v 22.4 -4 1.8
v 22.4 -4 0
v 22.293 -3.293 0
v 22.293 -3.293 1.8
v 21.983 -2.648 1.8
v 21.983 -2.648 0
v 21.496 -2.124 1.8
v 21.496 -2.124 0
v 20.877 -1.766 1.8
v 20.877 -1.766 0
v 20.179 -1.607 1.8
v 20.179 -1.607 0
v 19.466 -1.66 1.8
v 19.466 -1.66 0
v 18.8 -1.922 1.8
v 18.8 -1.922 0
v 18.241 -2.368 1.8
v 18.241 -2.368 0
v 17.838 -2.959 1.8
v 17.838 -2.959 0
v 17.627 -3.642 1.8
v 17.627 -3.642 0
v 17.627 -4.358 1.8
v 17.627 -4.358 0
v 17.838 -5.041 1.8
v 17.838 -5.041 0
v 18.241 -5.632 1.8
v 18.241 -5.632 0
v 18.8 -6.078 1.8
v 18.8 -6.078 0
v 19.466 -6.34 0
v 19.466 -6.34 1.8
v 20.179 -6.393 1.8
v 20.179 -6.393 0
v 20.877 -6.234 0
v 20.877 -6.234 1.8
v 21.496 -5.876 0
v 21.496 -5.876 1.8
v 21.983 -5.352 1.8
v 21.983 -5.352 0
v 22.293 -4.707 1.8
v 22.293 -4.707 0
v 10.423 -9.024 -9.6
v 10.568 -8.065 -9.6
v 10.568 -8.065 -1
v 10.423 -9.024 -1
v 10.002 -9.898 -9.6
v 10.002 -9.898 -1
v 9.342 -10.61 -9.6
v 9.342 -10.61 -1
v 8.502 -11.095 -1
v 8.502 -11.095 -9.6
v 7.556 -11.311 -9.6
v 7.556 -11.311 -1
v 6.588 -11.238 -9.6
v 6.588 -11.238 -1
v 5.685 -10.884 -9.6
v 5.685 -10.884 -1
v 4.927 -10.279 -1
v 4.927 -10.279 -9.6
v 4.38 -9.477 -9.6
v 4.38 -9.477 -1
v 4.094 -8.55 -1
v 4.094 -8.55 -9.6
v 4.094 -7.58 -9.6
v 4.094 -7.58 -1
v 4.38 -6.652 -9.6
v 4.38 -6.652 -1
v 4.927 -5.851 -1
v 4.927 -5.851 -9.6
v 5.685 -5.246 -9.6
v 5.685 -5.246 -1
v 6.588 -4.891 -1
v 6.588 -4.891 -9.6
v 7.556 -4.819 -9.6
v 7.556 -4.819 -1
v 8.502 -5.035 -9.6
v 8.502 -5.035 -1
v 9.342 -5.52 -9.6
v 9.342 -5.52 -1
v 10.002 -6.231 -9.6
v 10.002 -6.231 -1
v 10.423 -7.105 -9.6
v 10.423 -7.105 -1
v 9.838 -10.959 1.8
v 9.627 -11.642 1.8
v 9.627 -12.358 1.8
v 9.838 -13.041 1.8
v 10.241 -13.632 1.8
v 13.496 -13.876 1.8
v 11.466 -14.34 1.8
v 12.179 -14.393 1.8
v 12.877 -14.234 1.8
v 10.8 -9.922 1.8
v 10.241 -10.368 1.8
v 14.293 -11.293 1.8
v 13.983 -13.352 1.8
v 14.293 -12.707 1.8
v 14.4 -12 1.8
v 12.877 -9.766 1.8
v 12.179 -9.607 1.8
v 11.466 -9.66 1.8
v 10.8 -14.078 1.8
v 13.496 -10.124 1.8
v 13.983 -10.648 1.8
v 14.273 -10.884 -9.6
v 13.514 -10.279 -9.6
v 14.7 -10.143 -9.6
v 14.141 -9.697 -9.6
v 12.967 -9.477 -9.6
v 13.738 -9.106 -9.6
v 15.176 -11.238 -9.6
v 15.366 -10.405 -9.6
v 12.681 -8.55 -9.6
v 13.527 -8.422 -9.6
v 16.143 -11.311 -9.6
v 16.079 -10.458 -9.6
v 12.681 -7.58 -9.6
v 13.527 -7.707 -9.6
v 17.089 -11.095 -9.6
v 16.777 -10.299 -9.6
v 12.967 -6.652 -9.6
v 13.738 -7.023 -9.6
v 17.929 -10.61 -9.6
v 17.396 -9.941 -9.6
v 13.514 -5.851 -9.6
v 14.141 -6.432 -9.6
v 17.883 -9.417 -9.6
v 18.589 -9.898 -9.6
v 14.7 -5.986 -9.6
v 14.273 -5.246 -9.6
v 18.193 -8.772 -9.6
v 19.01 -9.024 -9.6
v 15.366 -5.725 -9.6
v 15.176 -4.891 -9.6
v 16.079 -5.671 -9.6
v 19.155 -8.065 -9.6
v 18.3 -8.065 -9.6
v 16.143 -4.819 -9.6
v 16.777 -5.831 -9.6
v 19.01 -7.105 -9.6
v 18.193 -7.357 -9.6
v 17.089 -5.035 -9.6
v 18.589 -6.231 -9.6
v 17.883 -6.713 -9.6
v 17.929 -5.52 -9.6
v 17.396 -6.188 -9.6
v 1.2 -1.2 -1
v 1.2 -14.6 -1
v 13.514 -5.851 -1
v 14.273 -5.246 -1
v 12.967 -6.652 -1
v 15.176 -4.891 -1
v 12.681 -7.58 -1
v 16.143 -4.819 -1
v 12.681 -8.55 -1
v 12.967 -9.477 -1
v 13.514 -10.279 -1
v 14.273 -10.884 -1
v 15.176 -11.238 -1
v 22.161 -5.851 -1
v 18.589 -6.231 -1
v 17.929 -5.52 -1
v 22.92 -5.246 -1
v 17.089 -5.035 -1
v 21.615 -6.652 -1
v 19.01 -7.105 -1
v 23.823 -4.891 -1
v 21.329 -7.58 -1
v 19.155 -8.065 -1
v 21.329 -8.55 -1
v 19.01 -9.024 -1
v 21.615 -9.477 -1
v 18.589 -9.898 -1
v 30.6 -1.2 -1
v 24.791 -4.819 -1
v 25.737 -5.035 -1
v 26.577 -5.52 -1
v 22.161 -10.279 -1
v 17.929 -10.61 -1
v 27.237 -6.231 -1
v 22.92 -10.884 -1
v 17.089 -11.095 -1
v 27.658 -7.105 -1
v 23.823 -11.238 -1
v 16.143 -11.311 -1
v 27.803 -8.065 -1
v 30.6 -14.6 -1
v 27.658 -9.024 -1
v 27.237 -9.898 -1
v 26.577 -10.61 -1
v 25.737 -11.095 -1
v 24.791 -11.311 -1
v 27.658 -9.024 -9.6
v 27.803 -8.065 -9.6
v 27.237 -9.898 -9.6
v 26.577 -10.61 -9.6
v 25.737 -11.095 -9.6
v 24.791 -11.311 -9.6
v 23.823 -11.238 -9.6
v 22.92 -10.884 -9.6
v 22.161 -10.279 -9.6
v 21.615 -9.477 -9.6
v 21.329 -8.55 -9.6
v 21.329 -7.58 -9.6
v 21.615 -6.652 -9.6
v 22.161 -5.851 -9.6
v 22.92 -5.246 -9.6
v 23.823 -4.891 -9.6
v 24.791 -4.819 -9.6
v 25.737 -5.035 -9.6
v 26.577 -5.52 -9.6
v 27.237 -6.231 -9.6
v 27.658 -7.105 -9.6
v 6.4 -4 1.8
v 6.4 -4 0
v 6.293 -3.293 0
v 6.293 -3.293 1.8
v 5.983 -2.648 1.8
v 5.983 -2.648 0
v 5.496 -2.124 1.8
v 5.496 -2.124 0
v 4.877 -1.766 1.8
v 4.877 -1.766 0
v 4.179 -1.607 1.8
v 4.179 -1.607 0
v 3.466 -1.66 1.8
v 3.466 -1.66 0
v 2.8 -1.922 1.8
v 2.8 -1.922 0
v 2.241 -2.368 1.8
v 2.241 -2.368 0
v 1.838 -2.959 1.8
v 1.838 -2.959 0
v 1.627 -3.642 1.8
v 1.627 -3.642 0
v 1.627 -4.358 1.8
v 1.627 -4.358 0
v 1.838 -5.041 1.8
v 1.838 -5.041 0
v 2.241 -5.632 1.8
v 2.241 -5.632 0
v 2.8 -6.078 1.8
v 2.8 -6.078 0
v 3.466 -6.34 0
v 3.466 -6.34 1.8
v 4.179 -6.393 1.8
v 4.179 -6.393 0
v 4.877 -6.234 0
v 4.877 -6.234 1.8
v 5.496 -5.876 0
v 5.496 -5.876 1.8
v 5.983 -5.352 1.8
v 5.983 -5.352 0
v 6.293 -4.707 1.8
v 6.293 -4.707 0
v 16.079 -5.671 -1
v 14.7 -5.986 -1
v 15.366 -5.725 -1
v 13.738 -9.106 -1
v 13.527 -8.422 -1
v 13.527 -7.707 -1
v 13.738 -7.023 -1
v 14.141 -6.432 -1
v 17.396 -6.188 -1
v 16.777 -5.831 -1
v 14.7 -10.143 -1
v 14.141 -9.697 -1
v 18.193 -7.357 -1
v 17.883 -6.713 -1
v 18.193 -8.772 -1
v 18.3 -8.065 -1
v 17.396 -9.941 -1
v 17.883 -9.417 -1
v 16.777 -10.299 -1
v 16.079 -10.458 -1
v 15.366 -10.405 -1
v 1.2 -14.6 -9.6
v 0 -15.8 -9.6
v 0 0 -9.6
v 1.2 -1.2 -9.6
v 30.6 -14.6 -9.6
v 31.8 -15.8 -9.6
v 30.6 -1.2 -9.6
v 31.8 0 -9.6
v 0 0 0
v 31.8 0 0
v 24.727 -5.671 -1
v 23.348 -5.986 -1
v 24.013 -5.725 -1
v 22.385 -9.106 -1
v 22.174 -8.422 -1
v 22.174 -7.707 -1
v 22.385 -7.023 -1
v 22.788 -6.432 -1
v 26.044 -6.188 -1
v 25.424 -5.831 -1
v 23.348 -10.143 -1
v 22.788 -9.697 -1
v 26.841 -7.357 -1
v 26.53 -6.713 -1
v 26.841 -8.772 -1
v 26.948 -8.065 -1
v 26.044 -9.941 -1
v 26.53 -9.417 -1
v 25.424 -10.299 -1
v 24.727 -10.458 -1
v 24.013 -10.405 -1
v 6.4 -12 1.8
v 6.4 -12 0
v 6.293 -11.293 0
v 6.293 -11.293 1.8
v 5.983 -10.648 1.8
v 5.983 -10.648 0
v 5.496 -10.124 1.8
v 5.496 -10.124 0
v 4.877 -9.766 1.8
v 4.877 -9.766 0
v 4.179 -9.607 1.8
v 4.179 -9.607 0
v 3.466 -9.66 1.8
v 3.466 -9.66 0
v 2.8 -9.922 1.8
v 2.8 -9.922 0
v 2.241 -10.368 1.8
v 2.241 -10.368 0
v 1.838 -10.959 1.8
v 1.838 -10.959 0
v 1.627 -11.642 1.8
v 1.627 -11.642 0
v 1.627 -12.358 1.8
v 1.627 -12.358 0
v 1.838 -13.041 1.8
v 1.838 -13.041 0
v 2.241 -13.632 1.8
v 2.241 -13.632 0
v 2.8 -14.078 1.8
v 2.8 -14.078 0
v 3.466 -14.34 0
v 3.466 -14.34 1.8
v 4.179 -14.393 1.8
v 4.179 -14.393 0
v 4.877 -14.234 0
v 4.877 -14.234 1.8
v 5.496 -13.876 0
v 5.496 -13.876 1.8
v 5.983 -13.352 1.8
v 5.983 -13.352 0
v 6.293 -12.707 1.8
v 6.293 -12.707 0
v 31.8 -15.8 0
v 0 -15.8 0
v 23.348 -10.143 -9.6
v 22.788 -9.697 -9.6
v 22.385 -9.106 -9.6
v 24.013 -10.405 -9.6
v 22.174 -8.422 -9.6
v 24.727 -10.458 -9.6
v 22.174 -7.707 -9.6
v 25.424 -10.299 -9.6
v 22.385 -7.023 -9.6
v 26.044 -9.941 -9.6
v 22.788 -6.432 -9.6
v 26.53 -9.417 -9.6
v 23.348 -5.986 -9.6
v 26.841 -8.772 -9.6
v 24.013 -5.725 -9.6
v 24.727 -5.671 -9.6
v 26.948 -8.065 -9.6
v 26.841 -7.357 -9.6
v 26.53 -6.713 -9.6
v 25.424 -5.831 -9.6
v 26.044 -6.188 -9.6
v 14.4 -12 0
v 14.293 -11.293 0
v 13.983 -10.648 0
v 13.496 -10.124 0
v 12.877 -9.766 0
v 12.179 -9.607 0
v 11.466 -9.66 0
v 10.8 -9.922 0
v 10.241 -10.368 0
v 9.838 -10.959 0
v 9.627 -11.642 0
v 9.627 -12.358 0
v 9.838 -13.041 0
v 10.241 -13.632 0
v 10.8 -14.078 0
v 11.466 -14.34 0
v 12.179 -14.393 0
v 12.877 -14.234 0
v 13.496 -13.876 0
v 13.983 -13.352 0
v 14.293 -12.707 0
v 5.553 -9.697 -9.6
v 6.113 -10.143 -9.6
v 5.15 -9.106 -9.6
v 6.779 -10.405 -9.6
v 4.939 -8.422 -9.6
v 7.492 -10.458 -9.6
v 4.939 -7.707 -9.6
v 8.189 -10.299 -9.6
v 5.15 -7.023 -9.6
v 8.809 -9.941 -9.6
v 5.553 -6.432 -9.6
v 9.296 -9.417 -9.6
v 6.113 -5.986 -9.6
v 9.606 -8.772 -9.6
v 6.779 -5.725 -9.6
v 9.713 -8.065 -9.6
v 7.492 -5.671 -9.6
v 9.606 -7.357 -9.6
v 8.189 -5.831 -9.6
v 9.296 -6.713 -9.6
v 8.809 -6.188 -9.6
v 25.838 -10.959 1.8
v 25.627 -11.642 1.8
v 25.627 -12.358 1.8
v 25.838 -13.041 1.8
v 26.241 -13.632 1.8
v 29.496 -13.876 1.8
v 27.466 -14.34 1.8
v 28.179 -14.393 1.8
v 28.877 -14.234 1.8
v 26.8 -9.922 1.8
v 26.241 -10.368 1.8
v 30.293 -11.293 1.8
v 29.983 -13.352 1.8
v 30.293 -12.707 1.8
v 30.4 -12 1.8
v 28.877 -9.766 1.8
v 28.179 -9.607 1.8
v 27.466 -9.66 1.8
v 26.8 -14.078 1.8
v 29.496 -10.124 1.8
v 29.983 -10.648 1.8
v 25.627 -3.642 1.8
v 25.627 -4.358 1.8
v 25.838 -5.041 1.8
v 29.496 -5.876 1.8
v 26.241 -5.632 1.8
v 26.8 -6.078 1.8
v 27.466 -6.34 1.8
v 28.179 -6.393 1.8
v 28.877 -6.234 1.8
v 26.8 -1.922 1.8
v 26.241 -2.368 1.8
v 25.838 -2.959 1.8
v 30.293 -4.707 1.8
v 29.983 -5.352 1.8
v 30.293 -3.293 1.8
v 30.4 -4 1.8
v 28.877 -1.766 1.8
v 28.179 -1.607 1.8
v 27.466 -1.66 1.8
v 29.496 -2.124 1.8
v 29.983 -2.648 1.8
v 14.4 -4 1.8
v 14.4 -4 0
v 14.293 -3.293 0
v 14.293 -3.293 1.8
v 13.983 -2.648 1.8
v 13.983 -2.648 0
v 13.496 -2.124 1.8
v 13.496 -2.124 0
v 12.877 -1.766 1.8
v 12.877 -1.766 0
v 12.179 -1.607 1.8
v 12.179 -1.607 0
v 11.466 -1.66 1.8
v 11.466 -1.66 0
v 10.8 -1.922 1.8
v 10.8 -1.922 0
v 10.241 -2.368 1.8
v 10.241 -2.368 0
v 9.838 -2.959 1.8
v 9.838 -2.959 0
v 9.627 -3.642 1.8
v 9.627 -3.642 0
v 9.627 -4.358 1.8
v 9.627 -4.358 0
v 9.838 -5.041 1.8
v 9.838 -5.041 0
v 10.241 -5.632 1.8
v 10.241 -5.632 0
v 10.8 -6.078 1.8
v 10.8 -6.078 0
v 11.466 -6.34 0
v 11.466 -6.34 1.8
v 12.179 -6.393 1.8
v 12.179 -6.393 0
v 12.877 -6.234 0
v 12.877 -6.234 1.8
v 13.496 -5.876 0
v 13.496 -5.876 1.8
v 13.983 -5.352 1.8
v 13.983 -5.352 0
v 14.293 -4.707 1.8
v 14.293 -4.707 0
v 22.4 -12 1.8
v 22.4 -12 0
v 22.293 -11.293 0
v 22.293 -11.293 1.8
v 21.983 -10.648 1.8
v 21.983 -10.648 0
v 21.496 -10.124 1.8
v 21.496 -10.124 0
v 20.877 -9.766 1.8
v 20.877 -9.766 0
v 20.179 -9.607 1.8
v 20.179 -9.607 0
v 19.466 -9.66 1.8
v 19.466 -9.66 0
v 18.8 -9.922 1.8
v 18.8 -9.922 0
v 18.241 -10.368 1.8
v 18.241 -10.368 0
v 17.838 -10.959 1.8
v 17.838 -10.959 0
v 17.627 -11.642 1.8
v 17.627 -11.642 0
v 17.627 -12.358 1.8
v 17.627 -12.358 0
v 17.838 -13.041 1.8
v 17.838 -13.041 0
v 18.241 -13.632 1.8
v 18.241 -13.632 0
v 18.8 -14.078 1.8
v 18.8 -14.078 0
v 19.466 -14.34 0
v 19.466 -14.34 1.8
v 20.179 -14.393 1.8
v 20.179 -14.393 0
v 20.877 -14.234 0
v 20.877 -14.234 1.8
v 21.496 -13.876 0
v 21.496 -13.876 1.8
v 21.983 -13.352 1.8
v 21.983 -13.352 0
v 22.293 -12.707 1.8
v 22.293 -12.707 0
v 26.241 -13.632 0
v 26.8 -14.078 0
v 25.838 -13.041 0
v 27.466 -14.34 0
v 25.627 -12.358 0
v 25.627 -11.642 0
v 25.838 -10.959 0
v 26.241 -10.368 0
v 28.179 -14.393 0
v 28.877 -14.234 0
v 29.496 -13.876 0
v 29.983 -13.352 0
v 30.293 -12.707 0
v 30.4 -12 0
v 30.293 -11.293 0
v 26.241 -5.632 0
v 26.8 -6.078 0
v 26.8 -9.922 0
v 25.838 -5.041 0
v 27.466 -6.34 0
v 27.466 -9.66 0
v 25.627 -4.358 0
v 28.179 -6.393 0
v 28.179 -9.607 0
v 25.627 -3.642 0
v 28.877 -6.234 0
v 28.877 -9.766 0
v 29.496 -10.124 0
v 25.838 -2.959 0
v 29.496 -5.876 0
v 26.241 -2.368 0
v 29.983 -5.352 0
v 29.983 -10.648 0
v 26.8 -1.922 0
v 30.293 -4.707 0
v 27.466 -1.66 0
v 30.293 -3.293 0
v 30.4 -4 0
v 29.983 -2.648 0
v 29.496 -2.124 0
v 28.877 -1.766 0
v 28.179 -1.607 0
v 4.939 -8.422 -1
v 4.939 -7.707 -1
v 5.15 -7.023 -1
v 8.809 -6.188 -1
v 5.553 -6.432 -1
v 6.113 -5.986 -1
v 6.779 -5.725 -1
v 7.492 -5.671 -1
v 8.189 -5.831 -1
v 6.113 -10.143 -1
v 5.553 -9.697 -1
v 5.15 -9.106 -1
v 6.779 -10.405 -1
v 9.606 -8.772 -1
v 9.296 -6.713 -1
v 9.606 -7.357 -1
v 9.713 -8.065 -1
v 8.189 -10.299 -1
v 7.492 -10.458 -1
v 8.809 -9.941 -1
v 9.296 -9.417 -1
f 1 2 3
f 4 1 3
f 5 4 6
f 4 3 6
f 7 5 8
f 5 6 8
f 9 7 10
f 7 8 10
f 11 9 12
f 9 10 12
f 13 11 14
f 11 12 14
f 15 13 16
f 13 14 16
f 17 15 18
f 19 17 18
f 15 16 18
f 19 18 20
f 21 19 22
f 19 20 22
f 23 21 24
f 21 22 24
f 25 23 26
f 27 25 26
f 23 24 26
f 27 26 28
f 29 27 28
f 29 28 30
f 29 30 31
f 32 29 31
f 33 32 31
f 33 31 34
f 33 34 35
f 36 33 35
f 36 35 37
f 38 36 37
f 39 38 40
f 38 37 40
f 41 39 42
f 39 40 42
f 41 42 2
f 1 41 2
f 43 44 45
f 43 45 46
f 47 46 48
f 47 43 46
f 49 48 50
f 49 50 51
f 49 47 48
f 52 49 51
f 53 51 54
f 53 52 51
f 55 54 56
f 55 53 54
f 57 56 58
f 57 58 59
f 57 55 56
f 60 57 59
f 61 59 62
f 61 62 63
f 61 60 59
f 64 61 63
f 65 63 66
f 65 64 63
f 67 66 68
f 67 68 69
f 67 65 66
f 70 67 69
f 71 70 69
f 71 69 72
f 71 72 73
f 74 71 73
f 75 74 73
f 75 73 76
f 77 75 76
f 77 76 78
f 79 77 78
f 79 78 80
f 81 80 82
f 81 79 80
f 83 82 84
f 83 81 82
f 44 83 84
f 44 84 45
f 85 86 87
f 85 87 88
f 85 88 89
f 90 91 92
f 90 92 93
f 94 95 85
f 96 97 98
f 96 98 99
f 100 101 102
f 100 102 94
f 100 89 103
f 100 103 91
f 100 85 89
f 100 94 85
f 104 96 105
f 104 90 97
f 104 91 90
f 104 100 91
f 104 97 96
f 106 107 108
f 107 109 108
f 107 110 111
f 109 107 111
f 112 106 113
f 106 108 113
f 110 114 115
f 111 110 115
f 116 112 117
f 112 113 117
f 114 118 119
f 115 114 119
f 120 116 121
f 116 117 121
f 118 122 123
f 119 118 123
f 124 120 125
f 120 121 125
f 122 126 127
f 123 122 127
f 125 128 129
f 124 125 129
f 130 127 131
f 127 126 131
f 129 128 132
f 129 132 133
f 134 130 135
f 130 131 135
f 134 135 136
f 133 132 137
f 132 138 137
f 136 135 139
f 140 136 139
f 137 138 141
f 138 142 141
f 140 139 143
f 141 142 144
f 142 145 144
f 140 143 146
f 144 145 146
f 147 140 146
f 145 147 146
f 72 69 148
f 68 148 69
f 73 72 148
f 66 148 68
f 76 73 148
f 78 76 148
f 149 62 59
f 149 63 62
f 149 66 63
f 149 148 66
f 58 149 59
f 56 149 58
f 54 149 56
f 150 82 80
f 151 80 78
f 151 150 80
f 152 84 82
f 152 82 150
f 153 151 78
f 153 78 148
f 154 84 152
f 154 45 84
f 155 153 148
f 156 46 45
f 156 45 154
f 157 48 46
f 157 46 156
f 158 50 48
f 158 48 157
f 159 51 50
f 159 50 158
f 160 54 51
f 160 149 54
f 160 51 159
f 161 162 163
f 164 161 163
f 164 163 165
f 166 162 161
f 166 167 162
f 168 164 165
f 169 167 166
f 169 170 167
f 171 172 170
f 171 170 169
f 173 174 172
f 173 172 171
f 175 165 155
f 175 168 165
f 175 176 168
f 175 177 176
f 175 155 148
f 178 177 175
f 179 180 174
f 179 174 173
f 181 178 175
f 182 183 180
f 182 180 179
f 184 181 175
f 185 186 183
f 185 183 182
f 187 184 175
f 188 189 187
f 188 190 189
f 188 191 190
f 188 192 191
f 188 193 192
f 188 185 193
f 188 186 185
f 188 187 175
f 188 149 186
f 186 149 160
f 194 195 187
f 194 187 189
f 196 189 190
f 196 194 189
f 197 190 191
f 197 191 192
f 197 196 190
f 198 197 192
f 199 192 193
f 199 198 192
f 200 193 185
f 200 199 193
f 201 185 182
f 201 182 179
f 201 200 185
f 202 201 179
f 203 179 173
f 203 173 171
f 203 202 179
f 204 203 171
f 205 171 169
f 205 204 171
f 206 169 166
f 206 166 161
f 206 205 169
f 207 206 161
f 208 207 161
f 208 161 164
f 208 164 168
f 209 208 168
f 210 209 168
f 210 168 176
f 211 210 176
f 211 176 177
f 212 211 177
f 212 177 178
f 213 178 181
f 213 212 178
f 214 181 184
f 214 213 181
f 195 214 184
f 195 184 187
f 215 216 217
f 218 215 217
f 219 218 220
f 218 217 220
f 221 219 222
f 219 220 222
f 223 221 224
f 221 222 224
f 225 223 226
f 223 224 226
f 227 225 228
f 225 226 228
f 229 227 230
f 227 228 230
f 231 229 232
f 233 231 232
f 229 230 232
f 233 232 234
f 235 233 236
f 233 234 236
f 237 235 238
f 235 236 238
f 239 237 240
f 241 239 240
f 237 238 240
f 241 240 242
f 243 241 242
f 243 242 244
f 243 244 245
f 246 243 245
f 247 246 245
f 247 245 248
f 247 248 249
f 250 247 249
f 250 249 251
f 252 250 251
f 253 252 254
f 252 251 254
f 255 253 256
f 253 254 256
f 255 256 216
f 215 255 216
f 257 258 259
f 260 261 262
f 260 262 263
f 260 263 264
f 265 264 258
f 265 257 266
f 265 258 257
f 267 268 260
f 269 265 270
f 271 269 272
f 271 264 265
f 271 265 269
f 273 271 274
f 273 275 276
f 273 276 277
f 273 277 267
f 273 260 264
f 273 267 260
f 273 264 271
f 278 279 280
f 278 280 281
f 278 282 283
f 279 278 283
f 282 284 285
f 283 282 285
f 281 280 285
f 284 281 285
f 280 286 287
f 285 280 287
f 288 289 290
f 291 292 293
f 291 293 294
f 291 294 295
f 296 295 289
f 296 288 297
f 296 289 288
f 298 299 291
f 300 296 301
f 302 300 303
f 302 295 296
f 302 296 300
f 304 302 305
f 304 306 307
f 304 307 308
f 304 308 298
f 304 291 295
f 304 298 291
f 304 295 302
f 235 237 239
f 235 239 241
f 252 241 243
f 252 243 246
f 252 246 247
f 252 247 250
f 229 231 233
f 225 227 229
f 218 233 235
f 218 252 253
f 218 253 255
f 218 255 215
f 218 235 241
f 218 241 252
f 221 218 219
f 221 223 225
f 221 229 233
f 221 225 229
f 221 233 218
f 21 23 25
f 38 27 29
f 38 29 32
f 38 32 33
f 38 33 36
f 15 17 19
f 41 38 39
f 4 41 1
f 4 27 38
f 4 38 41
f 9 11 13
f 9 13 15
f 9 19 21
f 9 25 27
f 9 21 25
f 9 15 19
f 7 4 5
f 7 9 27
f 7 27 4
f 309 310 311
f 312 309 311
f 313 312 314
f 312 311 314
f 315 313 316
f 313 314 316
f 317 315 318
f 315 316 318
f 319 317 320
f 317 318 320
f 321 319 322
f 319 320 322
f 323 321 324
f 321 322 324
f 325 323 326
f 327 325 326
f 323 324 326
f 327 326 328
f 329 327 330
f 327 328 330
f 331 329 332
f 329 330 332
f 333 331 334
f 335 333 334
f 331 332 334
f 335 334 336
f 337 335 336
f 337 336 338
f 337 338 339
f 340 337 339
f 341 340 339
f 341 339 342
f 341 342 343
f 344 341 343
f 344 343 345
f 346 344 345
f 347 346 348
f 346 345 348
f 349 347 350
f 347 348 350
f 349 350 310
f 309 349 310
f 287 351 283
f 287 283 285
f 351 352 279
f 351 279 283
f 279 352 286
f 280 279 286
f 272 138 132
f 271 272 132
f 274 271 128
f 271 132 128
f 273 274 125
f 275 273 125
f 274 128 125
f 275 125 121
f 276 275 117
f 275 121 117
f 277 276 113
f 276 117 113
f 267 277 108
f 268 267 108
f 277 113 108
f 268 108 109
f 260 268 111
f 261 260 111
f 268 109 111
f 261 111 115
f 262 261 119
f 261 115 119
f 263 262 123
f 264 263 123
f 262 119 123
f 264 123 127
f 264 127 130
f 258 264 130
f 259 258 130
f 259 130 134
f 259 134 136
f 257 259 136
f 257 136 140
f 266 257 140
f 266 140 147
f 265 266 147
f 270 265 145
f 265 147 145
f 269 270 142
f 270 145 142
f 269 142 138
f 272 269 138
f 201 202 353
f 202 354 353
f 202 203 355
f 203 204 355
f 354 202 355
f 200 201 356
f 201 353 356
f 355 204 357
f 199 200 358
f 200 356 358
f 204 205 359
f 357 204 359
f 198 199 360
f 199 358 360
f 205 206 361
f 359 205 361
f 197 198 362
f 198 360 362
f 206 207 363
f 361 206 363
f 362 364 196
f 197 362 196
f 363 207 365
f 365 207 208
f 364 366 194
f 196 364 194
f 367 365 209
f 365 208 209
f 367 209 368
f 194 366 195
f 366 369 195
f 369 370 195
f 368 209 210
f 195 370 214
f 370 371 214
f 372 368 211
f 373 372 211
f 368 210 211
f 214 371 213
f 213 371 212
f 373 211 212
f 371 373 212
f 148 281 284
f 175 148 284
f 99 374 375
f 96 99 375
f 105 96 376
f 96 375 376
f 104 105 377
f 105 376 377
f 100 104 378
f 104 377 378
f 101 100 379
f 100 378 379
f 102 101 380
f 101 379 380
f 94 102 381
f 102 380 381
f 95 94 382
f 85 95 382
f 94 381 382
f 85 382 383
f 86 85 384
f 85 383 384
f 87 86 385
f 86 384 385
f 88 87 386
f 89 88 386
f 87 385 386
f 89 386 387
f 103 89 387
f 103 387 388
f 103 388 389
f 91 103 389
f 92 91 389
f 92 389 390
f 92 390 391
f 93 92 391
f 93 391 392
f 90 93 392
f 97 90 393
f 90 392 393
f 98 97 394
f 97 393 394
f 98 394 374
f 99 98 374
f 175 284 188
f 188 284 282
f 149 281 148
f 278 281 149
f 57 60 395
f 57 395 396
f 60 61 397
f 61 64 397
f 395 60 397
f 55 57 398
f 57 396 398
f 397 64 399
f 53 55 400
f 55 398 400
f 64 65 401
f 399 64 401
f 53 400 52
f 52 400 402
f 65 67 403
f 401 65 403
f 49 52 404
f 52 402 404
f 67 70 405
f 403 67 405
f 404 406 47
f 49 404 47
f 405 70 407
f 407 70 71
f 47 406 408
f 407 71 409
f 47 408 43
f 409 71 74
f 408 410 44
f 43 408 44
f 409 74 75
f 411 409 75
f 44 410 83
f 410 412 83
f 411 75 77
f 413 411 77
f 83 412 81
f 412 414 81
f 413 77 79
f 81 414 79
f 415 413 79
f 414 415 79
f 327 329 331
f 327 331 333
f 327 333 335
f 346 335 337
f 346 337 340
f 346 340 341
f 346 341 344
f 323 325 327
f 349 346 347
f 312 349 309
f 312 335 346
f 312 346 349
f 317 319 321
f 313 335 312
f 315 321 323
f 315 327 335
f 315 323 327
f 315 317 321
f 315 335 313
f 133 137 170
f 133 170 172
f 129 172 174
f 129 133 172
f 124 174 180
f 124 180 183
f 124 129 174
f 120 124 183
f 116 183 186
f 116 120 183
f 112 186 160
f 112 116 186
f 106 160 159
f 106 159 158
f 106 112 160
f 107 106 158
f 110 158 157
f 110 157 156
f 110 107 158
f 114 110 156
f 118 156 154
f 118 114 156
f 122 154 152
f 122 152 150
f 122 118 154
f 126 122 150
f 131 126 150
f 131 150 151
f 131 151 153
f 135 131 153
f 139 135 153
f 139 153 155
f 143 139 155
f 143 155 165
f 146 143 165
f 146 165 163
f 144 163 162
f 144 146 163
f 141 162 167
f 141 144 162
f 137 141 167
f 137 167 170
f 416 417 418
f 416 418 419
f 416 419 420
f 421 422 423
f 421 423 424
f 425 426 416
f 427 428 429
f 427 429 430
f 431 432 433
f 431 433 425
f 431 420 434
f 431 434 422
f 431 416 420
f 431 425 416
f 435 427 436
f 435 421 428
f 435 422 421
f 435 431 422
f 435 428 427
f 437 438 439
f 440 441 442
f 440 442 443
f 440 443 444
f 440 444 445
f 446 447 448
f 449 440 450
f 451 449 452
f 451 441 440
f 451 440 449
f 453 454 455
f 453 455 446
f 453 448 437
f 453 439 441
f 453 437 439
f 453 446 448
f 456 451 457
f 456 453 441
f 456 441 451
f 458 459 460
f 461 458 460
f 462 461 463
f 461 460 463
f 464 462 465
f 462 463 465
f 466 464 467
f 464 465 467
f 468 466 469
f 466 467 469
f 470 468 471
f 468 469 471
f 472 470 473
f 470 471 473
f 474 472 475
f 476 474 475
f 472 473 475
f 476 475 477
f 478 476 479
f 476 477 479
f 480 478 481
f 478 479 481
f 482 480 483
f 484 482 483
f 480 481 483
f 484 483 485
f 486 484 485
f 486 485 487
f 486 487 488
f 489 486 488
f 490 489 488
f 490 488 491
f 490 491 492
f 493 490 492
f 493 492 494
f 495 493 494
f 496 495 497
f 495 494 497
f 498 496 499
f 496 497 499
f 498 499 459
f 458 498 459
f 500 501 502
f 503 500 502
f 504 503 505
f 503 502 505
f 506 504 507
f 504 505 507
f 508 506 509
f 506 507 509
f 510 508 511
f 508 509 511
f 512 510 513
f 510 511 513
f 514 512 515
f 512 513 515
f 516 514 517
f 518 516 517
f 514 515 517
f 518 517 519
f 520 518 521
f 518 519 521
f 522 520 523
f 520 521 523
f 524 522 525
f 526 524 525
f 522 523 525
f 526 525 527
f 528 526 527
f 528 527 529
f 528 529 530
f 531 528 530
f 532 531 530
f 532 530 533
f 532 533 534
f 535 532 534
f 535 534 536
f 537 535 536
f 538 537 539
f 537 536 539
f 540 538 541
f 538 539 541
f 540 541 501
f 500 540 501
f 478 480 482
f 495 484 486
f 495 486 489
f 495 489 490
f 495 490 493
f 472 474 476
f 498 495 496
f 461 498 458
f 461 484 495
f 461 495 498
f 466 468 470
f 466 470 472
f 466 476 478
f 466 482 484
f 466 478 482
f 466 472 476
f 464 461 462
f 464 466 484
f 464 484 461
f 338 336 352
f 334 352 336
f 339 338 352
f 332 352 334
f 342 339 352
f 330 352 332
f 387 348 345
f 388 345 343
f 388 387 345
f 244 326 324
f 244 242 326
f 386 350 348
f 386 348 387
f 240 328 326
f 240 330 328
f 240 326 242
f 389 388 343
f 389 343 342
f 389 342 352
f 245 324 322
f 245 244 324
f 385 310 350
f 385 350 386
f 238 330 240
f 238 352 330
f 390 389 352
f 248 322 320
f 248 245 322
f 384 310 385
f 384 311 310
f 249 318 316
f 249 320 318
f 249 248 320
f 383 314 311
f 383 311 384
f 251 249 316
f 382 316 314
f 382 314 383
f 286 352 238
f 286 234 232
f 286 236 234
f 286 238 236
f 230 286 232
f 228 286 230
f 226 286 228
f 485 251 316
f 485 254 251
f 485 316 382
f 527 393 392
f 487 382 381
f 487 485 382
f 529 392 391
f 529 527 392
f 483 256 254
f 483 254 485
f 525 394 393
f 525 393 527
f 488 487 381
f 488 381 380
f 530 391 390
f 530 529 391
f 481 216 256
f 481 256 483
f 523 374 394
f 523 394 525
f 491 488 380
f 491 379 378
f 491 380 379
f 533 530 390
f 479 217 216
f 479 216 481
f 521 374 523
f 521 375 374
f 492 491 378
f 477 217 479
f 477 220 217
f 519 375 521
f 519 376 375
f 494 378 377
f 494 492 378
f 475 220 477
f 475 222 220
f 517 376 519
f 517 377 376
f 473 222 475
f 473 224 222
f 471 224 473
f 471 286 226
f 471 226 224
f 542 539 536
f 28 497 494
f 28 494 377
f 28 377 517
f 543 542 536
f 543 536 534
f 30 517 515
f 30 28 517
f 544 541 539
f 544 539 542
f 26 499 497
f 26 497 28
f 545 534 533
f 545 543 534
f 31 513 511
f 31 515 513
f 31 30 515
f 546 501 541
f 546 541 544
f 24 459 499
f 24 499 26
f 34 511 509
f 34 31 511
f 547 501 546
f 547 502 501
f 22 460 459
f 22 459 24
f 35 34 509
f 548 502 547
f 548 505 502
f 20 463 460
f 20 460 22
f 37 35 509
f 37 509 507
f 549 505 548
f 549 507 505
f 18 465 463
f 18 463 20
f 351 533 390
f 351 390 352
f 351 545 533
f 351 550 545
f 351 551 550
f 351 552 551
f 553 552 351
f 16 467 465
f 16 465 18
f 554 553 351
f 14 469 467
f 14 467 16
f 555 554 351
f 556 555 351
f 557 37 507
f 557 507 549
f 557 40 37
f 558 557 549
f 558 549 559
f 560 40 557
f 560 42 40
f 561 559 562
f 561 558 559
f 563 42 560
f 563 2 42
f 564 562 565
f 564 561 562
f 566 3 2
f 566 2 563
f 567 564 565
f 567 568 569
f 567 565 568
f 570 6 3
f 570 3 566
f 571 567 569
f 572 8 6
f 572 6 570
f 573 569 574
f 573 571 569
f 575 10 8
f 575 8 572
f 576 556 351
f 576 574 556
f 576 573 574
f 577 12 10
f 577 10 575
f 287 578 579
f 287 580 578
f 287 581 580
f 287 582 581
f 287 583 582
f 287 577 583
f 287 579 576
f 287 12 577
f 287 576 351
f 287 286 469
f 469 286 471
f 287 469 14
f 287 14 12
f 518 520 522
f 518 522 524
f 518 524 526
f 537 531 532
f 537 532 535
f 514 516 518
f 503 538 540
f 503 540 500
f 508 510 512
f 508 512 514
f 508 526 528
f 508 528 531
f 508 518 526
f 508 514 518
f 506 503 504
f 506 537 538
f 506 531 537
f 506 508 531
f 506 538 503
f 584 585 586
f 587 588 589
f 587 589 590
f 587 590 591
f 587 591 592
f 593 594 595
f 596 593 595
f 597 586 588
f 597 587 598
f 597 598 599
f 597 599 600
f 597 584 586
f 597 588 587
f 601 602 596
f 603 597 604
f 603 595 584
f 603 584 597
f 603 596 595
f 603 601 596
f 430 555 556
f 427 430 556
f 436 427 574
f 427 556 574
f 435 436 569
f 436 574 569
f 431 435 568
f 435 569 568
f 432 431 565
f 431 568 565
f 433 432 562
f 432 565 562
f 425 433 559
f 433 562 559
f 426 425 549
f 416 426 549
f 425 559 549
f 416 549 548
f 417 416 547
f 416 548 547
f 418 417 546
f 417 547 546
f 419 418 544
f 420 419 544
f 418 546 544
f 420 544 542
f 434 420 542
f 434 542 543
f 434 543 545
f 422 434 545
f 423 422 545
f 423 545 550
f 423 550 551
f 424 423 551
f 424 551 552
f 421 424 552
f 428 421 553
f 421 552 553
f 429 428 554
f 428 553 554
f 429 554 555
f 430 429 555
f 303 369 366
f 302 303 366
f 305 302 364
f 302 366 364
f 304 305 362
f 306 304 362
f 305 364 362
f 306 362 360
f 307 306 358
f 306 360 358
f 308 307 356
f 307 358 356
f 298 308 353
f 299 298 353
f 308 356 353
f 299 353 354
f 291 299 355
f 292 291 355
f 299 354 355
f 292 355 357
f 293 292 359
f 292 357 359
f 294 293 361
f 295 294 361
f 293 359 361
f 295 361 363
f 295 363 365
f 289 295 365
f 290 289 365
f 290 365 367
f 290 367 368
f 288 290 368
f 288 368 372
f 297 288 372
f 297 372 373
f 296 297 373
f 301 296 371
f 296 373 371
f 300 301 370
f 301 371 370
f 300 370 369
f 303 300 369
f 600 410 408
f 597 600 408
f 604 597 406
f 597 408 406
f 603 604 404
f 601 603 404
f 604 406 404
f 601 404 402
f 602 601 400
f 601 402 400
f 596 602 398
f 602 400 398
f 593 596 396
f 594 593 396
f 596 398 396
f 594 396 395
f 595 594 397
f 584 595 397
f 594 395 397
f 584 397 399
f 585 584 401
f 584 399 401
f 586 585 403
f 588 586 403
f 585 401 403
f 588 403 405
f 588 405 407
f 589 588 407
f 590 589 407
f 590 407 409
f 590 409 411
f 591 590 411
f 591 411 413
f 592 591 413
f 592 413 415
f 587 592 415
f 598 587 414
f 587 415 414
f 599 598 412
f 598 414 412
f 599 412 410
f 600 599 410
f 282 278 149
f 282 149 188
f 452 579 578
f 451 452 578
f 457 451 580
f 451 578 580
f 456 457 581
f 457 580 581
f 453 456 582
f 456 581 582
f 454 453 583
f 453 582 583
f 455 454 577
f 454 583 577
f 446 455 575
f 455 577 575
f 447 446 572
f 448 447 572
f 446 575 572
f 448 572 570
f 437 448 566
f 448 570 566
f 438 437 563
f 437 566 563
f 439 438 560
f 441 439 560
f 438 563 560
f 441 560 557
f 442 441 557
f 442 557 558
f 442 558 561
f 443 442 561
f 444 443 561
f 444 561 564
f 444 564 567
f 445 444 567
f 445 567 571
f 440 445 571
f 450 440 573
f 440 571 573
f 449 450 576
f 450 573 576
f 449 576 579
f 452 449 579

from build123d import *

# Parameters (mm, degrees)
F0_W     = 31.800013
F0_H     = 15.799999
F1_DEPTH = 9.600006
F2_R     = 2.399995
F3_DEPTH = 1.799999
F4_W     = 29.400012
F4_H     = 13.399999
F4_R     = 3.255
F4_R_2   = 2.399995
F5_DEPTH = 8.600006


with BuildPart() as f1:
    # F0 (on Top) → F1 (new body)
    with BuildSketch(Plane.XY):
        with Locations((15.900006, -7.899999)):
            Rectangle(F0_W, F0_H)
    extrude(amount=-F1_DEPTH)

    # F2 (on Top) → F3 (join)
    with BuildSketch(Plane.XY):
        with Locations((3.999992, -4.000005)):
            Circle(F2_R)
        with Locations((12.000001, -4.000005)):
            Circle(F2_R)
        with Locations((20.000011, -4.000005)):
            Circle(F2_R)
        with Locations((28.00002, -4.000005)):
            Circle(F2_R)
        with Locations((28.00002, -12.000014)):
            Circle(F2_R)
        with Locations((20.000011, -12.000014)):
            Circle(F2_R)
        with Locations((12.000001, -12.000014)):
            Circle(F2_R)
        with Locations((3.999992, -12.000014)):
            Circle(F2_R)
    extrude(amount=F3_DEPTH)

    # F4 (on face) → F5 (cut)
    with BuildSketch(Plane(origin=(0, 0, -9.600006), x_dir=(1, 0, 0), z_dir=(0, 0, -1))):
        with Locations((15.900006, 7.899999)):
            Rectangle(F4_W, F4_H)
        with Locations((7.312597, 8.064775)):
            Circle(F4_R, mode=Mode.SUBTRACT)
        with Locations((15.900006, 8.064775)):
            Circle(F4_R, mode=Mode.SUBTRACT)
        with Locations((24.547525, 8.064775)):
            Circle(F4_R, mode=Mode.SUBTRACT)
        with Locations((7.312597, 8.064775)):
            Circle(F4_R_2)
        with Locations((15.900006, 8.064775)):
            Circle(F4_R_2)
        with Locations((24.547525, 8.064775)):
            Circle(F4_R_2)
    extrude(amount=-F5_DEPTH, mode=Mode.SUBTRACT)


solid = f1.part
